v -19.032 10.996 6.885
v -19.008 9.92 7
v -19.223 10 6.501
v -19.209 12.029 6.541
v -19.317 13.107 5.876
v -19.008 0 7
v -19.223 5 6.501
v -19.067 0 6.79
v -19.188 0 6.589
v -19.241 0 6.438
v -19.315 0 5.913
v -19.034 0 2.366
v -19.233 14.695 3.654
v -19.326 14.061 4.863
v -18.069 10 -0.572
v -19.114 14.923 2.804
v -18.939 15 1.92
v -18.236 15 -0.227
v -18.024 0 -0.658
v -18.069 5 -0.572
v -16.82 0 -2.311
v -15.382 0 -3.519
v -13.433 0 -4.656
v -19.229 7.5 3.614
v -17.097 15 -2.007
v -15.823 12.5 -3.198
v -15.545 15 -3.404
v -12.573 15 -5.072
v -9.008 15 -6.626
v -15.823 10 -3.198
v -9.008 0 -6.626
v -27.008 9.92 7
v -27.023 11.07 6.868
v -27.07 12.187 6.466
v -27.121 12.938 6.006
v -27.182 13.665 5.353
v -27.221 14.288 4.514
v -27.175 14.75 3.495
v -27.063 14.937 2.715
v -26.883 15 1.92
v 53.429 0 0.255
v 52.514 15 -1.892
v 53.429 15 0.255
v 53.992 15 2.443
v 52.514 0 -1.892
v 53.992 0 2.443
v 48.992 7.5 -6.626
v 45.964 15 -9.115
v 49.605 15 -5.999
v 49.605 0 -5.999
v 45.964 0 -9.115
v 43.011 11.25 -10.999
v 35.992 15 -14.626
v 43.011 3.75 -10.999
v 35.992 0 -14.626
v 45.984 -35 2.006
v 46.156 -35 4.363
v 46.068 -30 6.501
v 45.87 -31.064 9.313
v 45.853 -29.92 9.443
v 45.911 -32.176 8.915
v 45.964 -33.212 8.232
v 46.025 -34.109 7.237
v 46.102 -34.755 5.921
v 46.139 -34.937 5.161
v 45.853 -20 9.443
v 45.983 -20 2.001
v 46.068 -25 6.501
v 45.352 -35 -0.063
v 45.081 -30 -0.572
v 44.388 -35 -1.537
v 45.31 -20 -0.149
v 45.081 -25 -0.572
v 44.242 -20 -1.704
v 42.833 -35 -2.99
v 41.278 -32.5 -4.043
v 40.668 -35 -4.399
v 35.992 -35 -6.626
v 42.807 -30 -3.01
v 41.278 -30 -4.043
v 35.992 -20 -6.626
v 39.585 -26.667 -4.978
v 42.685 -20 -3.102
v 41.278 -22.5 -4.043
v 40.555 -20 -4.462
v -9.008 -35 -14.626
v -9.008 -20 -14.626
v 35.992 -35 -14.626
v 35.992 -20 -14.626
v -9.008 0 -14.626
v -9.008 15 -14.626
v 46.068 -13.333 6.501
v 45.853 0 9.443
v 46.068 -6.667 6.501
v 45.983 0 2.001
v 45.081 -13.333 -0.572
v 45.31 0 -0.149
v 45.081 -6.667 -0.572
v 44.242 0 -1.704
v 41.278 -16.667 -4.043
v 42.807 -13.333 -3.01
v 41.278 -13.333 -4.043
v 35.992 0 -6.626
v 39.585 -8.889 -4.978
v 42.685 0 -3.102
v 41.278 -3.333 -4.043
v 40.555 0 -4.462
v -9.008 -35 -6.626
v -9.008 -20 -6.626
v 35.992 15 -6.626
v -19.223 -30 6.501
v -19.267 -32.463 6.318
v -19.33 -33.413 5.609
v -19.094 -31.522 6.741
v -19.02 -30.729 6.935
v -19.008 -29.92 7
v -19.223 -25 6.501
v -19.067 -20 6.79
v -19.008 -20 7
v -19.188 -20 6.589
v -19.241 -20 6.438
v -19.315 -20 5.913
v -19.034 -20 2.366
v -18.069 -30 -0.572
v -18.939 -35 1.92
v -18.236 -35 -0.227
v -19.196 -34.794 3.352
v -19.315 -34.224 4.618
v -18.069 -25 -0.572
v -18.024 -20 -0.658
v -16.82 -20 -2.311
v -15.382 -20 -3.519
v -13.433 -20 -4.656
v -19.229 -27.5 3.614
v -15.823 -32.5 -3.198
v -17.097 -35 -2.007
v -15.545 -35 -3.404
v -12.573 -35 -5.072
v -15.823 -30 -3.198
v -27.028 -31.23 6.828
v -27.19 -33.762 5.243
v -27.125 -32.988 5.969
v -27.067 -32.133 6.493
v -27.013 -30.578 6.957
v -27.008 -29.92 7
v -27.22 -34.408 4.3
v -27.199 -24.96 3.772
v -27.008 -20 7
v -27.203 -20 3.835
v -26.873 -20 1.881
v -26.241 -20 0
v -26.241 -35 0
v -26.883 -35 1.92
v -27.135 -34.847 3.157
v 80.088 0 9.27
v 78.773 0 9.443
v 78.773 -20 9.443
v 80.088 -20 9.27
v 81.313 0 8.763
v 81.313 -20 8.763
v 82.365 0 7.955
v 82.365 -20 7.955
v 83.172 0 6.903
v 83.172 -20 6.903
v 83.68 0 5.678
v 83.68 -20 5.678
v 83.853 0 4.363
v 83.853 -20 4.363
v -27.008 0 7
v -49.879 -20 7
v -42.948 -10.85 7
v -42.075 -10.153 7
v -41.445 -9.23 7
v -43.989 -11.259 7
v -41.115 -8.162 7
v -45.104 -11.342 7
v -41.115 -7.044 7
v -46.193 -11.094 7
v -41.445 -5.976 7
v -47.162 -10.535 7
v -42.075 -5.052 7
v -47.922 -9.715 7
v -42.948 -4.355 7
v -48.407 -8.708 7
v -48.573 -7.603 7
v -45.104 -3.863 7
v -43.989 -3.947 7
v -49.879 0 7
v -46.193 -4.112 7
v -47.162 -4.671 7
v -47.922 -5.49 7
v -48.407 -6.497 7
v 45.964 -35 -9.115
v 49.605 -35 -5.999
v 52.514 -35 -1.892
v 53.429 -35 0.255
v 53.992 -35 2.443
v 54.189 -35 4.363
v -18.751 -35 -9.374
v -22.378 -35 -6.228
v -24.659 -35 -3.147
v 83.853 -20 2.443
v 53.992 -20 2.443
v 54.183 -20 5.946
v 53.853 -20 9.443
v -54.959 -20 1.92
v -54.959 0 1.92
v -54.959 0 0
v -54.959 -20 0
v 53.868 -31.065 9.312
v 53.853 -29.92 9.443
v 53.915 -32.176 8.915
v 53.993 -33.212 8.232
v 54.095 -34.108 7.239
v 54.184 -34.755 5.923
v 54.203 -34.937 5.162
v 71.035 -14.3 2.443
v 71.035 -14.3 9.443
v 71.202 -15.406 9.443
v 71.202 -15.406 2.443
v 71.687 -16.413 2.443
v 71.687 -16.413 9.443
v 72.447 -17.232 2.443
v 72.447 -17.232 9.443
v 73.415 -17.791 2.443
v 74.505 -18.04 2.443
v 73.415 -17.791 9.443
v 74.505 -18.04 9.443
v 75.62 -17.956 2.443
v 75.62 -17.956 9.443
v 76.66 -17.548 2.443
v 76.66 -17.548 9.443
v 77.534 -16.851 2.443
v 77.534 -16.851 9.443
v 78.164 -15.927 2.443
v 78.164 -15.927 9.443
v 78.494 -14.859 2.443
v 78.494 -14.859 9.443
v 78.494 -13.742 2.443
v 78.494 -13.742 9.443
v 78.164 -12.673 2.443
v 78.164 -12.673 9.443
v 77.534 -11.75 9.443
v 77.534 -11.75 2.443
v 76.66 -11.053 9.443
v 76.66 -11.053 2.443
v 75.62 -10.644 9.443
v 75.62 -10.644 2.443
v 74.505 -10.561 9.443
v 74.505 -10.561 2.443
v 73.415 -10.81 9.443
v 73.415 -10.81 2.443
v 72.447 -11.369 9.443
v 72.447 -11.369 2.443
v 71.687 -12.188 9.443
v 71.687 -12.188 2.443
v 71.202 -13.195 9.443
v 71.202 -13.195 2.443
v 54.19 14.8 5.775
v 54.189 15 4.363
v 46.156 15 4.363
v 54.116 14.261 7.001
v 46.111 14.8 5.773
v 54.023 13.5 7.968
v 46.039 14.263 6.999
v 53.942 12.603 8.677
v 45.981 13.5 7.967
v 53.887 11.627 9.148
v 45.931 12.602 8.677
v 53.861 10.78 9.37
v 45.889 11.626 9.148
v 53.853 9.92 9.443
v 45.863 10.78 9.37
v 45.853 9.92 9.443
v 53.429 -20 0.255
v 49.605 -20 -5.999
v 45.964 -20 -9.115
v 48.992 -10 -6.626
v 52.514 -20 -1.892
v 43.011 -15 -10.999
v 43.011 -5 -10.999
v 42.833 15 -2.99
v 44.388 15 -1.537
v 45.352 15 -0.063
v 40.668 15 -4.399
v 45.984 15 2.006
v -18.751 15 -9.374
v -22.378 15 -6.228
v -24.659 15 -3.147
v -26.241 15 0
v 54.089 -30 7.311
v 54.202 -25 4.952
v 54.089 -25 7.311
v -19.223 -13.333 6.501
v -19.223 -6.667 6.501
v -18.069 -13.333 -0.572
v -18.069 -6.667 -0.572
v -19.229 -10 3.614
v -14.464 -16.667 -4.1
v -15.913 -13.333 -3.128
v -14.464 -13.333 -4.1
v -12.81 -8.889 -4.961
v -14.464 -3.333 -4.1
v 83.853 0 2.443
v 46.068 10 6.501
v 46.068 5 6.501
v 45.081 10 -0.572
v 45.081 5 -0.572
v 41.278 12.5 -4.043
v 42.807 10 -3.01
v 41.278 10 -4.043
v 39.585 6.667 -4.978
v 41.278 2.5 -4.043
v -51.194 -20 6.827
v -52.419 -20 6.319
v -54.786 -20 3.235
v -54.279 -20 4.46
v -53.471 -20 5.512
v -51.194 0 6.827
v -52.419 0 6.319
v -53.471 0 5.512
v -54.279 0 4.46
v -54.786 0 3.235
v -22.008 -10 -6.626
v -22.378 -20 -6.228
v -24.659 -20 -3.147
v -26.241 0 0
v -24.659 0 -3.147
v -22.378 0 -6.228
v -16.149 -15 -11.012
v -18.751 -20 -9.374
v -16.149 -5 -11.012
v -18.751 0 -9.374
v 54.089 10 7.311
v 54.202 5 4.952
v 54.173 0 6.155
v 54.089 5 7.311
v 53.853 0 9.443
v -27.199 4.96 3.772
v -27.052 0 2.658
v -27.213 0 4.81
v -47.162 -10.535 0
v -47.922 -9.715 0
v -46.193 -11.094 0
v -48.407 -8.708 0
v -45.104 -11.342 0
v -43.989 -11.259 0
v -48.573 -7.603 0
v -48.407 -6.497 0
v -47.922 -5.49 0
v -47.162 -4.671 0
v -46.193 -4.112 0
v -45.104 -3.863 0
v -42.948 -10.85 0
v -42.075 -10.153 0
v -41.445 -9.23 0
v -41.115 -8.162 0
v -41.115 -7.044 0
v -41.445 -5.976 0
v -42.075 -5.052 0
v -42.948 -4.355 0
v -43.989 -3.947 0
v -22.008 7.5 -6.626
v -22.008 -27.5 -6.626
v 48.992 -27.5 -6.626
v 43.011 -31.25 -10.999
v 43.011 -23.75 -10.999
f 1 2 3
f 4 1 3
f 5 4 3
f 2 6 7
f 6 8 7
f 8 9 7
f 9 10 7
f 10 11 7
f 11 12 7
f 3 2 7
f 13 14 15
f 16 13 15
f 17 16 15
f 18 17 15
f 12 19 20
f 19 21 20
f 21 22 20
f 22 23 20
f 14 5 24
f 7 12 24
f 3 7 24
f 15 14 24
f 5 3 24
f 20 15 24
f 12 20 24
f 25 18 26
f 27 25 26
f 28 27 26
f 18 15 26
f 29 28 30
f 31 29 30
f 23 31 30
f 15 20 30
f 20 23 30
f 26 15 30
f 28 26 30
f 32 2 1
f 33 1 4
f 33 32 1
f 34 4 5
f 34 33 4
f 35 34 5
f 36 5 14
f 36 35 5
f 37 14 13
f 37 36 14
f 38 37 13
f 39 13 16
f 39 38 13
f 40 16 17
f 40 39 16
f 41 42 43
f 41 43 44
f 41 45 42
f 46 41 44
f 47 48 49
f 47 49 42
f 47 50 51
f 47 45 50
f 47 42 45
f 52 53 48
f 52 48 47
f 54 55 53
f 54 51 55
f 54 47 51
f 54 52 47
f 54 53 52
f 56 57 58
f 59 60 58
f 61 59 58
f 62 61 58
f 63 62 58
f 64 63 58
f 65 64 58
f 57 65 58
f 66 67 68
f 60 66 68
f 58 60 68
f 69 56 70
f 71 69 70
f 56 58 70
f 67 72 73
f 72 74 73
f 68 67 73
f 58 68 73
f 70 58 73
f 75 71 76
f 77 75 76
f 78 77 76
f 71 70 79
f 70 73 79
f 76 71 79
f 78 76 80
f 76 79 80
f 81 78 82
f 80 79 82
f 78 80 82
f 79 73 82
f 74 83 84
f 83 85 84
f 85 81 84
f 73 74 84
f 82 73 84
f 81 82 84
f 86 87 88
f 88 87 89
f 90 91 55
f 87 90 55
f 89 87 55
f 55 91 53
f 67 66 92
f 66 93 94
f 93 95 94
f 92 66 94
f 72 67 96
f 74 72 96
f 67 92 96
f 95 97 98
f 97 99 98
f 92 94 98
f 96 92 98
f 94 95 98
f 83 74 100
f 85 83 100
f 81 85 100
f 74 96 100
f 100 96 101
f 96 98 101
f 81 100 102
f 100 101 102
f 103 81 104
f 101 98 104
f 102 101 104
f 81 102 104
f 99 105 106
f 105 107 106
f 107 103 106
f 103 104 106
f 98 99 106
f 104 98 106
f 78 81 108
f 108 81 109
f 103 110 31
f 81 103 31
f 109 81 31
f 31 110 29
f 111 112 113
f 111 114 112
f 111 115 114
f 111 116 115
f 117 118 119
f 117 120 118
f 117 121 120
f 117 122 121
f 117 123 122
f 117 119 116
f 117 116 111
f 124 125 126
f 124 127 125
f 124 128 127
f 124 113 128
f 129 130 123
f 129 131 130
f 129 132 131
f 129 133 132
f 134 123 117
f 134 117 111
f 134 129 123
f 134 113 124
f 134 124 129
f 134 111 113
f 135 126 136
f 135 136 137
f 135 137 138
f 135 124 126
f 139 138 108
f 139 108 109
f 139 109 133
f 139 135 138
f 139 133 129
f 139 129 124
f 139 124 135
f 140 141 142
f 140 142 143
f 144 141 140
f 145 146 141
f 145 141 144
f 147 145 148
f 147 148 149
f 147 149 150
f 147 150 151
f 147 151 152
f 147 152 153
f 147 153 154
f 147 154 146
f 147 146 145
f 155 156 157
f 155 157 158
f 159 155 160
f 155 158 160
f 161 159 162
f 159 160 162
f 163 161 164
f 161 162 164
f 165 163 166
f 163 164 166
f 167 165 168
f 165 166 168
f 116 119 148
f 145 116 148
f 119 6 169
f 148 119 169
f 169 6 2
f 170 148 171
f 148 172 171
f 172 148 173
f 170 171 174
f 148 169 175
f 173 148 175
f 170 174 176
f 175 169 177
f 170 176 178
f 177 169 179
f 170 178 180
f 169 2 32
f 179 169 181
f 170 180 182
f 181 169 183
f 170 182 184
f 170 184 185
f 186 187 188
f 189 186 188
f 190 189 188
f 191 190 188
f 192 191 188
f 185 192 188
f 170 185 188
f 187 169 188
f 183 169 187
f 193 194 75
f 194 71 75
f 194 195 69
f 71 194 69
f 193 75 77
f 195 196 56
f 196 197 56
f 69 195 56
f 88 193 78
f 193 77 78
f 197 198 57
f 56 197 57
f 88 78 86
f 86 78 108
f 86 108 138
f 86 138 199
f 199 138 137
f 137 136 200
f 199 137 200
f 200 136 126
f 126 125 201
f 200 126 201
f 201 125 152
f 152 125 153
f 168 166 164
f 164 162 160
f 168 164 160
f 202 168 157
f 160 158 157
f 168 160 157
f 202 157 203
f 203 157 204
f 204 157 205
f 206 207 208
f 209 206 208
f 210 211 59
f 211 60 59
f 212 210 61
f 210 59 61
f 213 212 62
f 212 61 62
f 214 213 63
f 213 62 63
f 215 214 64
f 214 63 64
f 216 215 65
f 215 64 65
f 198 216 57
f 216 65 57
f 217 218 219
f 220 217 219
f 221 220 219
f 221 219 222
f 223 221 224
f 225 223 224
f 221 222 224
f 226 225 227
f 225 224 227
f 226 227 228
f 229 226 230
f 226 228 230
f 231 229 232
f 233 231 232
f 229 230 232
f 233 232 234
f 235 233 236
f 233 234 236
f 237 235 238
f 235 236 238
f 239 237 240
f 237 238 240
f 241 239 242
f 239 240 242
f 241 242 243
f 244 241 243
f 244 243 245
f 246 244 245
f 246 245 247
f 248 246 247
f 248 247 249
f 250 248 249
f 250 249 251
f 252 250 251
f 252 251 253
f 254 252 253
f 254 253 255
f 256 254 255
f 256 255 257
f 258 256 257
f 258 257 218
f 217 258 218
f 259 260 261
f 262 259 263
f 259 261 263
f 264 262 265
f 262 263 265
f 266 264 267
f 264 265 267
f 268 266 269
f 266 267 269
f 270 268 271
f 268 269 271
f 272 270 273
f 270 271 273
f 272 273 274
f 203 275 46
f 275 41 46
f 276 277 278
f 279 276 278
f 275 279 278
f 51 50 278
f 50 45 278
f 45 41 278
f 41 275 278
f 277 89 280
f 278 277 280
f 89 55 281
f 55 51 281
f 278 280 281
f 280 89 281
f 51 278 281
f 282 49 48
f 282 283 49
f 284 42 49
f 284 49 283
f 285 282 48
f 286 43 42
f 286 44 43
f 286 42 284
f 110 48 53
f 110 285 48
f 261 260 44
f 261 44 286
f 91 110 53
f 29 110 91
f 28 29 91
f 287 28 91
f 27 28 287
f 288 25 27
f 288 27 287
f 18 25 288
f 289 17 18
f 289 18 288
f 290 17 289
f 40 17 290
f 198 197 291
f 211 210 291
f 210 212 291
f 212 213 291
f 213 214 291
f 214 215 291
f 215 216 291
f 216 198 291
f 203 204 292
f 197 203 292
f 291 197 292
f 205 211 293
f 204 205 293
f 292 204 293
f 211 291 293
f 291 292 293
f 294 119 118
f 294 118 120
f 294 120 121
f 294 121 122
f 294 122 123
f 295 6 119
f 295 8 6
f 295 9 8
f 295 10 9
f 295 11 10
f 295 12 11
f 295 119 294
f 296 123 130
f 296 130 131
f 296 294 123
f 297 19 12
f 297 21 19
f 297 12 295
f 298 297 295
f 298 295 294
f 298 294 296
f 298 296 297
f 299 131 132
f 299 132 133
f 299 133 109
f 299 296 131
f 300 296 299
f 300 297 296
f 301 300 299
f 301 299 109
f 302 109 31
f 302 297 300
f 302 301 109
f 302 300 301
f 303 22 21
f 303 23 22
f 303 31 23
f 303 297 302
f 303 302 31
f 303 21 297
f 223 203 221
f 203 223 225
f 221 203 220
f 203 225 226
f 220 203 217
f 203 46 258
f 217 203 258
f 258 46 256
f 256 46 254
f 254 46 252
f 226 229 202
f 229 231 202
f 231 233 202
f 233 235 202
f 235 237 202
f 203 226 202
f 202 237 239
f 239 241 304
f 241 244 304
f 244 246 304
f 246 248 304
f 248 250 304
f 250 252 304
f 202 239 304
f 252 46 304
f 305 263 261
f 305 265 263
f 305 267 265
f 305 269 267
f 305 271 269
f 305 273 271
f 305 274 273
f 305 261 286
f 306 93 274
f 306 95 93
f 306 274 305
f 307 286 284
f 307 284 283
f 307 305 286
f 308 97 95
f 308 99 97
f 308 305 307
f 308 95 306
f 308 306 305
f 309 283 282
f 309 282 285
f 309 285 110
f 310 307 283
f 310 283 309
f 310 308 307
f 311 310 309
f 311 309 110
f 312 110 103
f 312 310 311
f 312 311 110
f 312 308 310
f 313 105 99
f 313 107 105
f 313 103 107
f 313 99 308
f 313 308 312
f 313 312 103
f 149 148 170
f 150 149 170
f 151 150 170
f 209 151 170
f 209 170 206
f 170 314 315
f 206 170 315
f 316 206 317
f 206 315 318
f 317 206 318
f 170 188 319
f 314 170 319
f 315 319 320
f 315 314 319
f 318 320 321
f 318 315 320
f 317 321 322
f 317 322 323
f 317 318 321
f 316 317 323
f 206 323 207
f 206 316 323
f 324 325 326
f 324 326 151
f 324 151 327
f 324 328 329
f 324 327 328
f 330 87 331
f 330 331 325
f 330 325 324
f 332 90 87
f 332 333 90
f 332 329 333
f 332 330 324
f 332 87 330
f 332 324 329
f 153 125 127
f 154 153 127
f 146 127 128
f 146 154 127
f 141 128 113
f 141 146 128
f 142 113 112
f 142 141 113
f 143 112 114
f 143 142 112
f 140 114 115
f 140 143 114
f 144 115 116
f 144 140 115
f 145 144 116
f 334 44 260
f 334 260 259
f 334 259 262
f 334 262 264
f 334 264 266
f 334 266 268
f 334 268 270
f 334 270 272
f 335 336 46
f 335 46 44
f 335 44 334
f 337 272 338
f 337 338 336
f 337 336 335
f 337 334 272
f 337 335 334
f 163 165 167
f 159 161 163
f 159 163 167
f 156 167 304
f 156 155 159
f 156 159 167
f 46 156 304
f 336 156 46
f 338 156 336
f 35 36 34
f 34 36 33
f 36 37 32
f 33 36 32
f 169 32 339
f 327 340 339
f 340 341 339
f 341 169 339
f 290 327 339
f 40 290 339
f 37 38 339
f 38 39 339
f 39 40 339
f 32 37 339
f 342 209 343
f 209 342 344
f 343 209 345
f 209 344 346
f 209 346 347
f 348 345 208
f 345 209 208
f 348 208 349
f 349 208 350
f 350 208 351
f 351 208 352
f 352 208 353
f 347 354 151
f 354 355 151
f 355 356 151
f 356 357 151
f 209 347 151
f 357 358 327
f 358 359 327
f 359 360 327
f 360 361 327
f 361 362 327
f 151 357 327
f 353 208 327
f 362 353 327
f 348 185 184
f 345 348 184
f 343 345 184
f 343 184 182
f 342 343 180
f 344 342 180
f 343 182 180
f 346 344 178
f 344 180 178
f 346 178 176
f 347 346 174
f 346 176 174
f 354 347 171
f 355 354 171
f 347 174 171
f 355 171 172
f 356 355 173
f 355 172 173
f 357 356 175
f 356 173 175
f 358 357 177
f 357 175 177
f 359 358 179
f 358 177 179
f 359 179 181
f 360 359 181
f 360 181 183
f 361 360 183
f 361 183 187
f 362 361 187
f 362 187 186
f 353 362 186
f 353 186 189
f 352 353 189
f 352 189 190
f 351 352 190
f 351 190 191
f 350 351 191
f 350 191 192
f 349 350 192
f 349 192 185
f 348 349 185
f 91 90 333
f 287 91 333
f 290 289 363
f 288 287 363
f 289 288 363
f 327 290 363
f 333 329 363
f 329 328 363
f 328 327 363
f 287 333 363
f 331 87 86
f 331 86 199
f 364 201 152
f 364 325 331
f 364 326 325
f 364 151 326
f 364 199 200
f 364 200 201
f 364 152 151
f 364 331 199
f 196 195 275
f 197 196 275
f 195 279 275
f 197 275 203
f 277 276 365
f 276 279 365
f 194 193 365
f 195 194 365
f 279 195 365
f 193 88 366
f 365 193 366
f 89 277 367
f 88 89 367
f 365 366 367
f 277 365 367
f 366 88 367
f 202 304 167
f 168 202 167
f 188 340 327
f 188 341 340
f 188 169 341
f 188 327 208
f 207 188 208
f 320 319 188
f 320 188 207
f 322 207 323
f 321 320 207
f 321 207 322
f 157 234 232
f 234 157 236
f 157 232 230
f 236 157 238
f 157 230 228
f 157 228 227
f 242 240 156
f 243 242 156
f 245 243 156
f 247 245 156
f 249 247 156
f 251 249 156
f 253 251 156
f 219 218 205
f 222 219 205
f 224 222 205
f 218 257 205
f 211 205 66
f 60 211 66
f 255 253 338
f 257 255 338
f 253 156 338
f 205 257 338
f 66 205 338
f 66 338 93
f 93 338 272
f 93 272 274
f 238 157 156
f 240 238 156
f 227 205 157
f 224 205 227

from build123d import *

# Parameters (mm, degrees)
F1_DEPTH = 15
F2_DEPTH = 20
F3_DEPTH = 35
F5_R     = 5.08
F6_R     = 5.08
F7_R     = 5.08
F8_R     = 5.08
F9_R     = 5.08
F10_D    = 7.5


with BuildPart() as f1:
    # F0 (on Front) → F1 (new body)
    with BuildSketch(Plane.XZ):
        with BuildLine():
            add(Edge.make_bspline(
                [(-9.0078394144, -14.6261555421), (-14.006421456, -12.219431046), (-21.4777151753, -8.7987738685), (-25.373944364, -2.1621207849), (-26.2406452466, 0)],
                knots=[0, 0, 0, 0, 0.4219290451, 0.6690640109, 0.6690640109, 0.6690640109, 0.6690640109], degree=3))
            Line((-9.0078394144, -14.6261555421), (35.9921605856, -14.6261555421))
            add(Edge.make_bspline(
                [(35.9921605856, -14.6261555421), (40.7291624411, -12.3453770516), (49.6848707909, -7.8887732182), (53.4571237511, -0.6658874553), (53.9921605856, 2.4431246054)],
                knots=[0, 0, 0, 0, 0.3998491278, 0.7291996551, 0.7291996551, 0.7291996551, 0.7291996551], degree=3))
            add(Edge.make_bspline(
                [(53.9921605856, 2.4431246054), (54.4320814217, 4.9994330631), (54.0818703156, 7.4521168259), (53.8528075786, 9.4431246054)],
                knots=[0.7291996551, 0.7291996551, 0.7291996551, 0.7291996551, 1, 1, 1, 1], degree=3))
            Line((53.8528075786, 9.4431246054), (45.8528075786, 9.4431246054))
            add(Edge.make_bspline(
                [(45.8528075786, 9.4431246054), (45.9380271862, 8.8438899514), (46.0685244466, 6.2436364853), (46.6196397936, -1.8447716738), (39.5795212377, -5.0875957452), (35.9921605856, -6.6261555421)],
                knots=[0, 0, 0, 0, 0.2232213361, 0.5705276676, 1, 1, 1, 1], degree=3))
            Line((35.9921605856, -6.6261555421), (-9.0078394144, -6.6261555421))
            add(Edge.make_bspline(
                [(-19.0078394144, 7), (-19.053505059, 6.7049076197), (-19.5120334536, 6.7583982823), (-19.2237277553, -2.712889397), (-13.0753368013, -4.8592315184), (-9.0078394144, -6.6261555421)],
                knots=[0, 0, 0, 0, 0.1097832683, 0.5084327524, 1, 1, 1, 1], degree=3))
            Line((-19.0078394144, 7), (-27.0078394144, 7))
            add(Edge.make_bspline(
                [(-26.2406452466, 0), (-26.592756236, 0.8783958848), (-27.4419103236, 3.6162903723), (-27.2028414979, 5.3050465987), (-27.0078394144, 7)],
                knots=[0.6690640109, 0.6690640109, 0.6690640109, 0.6690640109, 0.7694665132, 1, 1, 1, 1], degree=3))
        make_face()
    extrude(amount=-F1_DEPTH)

    # F0 (on Front) → F2 (join)
    with BuildSketch(Plane.XZ):
        with BuildLine():
            add(Edge.make_bspline(
                [(-9.0078394144, -14.6261555421), (-14.006421456, -12.219431046), (-21.4777151753, -8.7987738685), (-25.373944364, -2.1621207849), (-26.2406452466, 0)],
                knots=[0, 0, 0, 0, 0.4219290451, 0.6690640109, 0.6690640109, 0.6690640109, 0.6690640109], degree=3))
            Line((-9.0078394144, -14.6261555421), (35.9921605856, -14.6261555421))
            add(Edge.make_bspline(
                [(35.9921605856, -14.6261555421), (40.7291624411, -12.3453770516), (49.6848707909, -7.8887732182), (53.4571237511, -0.6658874553), (53.9921605856, 2.4431246054)],
                knots=[0, 0, 0, 0, 0.3998491278, 0.7291996551, 0.7291996551, 0.7291996551, 0.7291996551], degree=3))
            add(Edge.make_bspline(
                [(53.9921605856, 2.4431246054), (54.4320814217, 4.9994330631), (54.0818703156, 7.4521168259), (53.8528075786, 9.4431246054)],
                knots=[0.7291996551, 0.7291996551, 0.7291996551, 0.7291996551, 1, 1, 1, 1], degree=3))
            Line((53.8528075786, 9.4431246054), (45.8528075786, 9.4431246054))
            add(Edge.make_bspline(
                [(45.8528075786, 9.4431246054), (45.9380271862, 8.8438899514), (46.0685244466, 6.2436364853), (46.6196397936, -1.8447716738), (39.5795212377, -5.0875957452), (35.9921605856, -6.6261555421)],
                knots=[0, 0, 0, 0, 0.2232213361, 0.5705276676, 1, 1, 1, 1], degree=3))
            Line((35.9921605856, -6.6261555421), (-9.0078394144, -6.6261555421))
            add(Edge.make_bspline(
                [(-19.0078394144, 7), (-19.053505059, 6.7049076197), (-19.5120334536, 6.7583982823), (-19.2237277553, -2.712889397), (-13.0753368013, -4.8592315184), (-9.0078394144, -6.6261555421)],
                knots=[0, 0, 0, 0, 0.1097832683, 0.5084327524, 1, 1, 1, 1], degree=3))
            Line((-19.0078394144, 7), (-27.0078394144, 7))
            add(Edge.make_bspline(
                [(-26.2406452466, 0), (-26.592756236, 0.8783958848), (-27.4419103236, 3.6162903723), (-27.2028414979, 5.3050465987), (-27.0078394144, 7)],
                knots=[0.6690640109, 0.6690640109, 0.6690640109, 0.6690640109, 0.7694665132, 1, 1, 1, 1], degree=3))
        make_face()
        with BuildLine():
            Line((-54.9591742456, 0), (-26.2406452466, 0))
            add(Edge.make_bspline(
                [(-26.2406452466, 0), (-26.592756236, 0.8783958848), (-27.4419103236, 3.6162903723), (-27.2028414979, 5.3050465987), (-27.0078394144, 7)],
                knots=[0.6690640109, 0.6690640109, 0.6690640109, 0.6690640109, 0.7694665132, 1, 1, 1, 1], degree=3))
            Line((-27.0078394144, 7), (-54.9591742456, 7))
            Line((-54.9591742456, 7), (-54.9591742456, 0))
        make_face()
        with BuildLine():
            add(Edge.make_bspline(
                [(53.9921605856, 2.4431246054), (54.4320814217, 4.9994330631), (54.0818703156, 7.4521168259), (53.8528075786, 9.4431246054)],
                knots=[0.7291996551, 0.7291996551, 0.7291996551, 0.7291996551, 1, 1, 1, 1], degree=3))
            Line((53.9921605856, 2.4431246054), (83.8528075786, 2.4431246054))
            Line((83.8528075786, 2.4431246054), (83.8528075786, 9.4431246054))
            Line((83.8528075786, 9.4431246054), (53.8528075786, 9.4431246054))
        make_face()
    extrude(amount=F2_DEPTH)

    # F0 (on Front) → F3 (join)
    with BuildSketch(Plane.XZ):
        with BuildLine():
            add(Edge.make_bspline(
                [(-9.0078394144, -14.6261555421), (-14.006421456, -12.219431046), (-21.4777151753, -8.7987738685), (-25.373944364, -2.1621207849), (-26.2406452466, 0)],
                knots=[0, 0, 0, 0, 0.4219290451, 0.6690640109, 0.6690640109, 0.6690640109, 0.6690640109], degree=3))
            Line((-9.0078394144, -14.6261555421), (35.9921605856, -14.6261555421))
            add(Edge.make_bspline(
                [(35.9921605856, -14.6261555421), (40.7291624411, -12.3453770516), (49.6848707909, -7.8887732182), (53.4571237511, -0.6658874553), (53.9921605856, 2.4431246054)],
                knots=[0, 0, 0, 0, 0.3998491278, 0.7291996551, 0.7291996551, 0.7291996551, 0.7291996551], degree=3))
            add(Edge.make_bspline(
                [(53.9921605856, 2.4431246054), (54.4320814217, 4.9994330631), (54.0818703156, 7.4521168259), (53.8528075786, 9.4431246054)],
                knots=[0.7291996551, 0.7291996551, 0.7291996551, 0.7291996551, 1, 1, 1, 1], degree=3))
            Line((53.8528075786, 9.4431246054), (45.8528075786, 9.4431246054))
            add(Edge.make_bspline(
                [(45.8528075786, 9.4431246054), (45.9380271862, 8.8438899514), (46.0685244466, 6.2436364853), (46.6196397936, -1.8447716738), (39.5795212377, -5.0875957452), (35.9921605856, -6.6261555421)],
                knots=[0, 0, 0, 0, 0.2232213361, 0.5705276676, 1, 1, 1, 1], degree=3))
            Line((35.9921605856, -6.6261555421), (-9.0078394144, -6.6261555421))
            add(Edge.make_bspline(
                [(-19.0078394144, 7), (-19.053505059, 6.7049076197), (-19.5120334536, 6.7583982823), (-19.2237277553, -2.712889397), (-13.0753368013, -4.8592315184), (-9.0078394144, -6.6261555421)],
                knots=[0, 0, 0, 0, 0.1097832683, 0.5084327524, 1, 1, 1, 1], degree=3))
            Line((-19.0078394144, 7), (-27.0078394144, 7))
            add(Edge.make_bspline(
                [(-26.2406452466, 0), (-26.592756236, 0.8783958848), (-27.4419103236, 3.6162903723), (-27.2028414979, 5.3050465987), (-27.0078394144, 7)],
                knots=[0.6690640109, 0.6690640109, 0.6690640109, 0.6690640109, 0.7694665132, 1, 1, 1, 1], degree=3))
        make_face()
    extrude(amount=F3_DEPTH)

    # F5
    f5_edges = [f1.edges().sort_by_distance(p)[0] for p in [
        (83.852808, -10, 9.443125),
    ]]
    fillet(f5_edges, radius=F5_R)

    # F6
    f6_edges = [f1.edges().sort_by_distance(p)[0] for p in [
        (-54.959174, -10, 7),
        (49.852808, -35, 9.443125),
    ]]
    fillet(f6_edges, radius=F6_R)

    # F7
    f7_edges = [f1.edges().sort_by_distance(p)[0] for p in [
        (-23.007839, -35, 7),
    ]]
    fillet(f7_edges, radius=F7_R)

    # F8
    f8_edges = [f1.edges().sort_by_distance(p)[0] for p in [
        (-23.007839, 15, 7),
    ]]
    fillet(f8_edges, radius=F8_R)

    # F9
    f9_edges = [f1.edges().sort_by_distance(p)[0] for p in [
        (49.852808, 15, 9.443125),
    ]]
    fillet(f9_edges, radius=F9_R)

    # F10 (through all)
    with Locations(Plane(origin=(0, 0, 0), x_dir=(1, 0, 0), z_dir=(0, 0, -1))):
        with Locations((-44.82346192, 7.6027605683), (74.7854933143, 14.3004301935)):
            Hole(F10_D / 2)


solid = f1.part
